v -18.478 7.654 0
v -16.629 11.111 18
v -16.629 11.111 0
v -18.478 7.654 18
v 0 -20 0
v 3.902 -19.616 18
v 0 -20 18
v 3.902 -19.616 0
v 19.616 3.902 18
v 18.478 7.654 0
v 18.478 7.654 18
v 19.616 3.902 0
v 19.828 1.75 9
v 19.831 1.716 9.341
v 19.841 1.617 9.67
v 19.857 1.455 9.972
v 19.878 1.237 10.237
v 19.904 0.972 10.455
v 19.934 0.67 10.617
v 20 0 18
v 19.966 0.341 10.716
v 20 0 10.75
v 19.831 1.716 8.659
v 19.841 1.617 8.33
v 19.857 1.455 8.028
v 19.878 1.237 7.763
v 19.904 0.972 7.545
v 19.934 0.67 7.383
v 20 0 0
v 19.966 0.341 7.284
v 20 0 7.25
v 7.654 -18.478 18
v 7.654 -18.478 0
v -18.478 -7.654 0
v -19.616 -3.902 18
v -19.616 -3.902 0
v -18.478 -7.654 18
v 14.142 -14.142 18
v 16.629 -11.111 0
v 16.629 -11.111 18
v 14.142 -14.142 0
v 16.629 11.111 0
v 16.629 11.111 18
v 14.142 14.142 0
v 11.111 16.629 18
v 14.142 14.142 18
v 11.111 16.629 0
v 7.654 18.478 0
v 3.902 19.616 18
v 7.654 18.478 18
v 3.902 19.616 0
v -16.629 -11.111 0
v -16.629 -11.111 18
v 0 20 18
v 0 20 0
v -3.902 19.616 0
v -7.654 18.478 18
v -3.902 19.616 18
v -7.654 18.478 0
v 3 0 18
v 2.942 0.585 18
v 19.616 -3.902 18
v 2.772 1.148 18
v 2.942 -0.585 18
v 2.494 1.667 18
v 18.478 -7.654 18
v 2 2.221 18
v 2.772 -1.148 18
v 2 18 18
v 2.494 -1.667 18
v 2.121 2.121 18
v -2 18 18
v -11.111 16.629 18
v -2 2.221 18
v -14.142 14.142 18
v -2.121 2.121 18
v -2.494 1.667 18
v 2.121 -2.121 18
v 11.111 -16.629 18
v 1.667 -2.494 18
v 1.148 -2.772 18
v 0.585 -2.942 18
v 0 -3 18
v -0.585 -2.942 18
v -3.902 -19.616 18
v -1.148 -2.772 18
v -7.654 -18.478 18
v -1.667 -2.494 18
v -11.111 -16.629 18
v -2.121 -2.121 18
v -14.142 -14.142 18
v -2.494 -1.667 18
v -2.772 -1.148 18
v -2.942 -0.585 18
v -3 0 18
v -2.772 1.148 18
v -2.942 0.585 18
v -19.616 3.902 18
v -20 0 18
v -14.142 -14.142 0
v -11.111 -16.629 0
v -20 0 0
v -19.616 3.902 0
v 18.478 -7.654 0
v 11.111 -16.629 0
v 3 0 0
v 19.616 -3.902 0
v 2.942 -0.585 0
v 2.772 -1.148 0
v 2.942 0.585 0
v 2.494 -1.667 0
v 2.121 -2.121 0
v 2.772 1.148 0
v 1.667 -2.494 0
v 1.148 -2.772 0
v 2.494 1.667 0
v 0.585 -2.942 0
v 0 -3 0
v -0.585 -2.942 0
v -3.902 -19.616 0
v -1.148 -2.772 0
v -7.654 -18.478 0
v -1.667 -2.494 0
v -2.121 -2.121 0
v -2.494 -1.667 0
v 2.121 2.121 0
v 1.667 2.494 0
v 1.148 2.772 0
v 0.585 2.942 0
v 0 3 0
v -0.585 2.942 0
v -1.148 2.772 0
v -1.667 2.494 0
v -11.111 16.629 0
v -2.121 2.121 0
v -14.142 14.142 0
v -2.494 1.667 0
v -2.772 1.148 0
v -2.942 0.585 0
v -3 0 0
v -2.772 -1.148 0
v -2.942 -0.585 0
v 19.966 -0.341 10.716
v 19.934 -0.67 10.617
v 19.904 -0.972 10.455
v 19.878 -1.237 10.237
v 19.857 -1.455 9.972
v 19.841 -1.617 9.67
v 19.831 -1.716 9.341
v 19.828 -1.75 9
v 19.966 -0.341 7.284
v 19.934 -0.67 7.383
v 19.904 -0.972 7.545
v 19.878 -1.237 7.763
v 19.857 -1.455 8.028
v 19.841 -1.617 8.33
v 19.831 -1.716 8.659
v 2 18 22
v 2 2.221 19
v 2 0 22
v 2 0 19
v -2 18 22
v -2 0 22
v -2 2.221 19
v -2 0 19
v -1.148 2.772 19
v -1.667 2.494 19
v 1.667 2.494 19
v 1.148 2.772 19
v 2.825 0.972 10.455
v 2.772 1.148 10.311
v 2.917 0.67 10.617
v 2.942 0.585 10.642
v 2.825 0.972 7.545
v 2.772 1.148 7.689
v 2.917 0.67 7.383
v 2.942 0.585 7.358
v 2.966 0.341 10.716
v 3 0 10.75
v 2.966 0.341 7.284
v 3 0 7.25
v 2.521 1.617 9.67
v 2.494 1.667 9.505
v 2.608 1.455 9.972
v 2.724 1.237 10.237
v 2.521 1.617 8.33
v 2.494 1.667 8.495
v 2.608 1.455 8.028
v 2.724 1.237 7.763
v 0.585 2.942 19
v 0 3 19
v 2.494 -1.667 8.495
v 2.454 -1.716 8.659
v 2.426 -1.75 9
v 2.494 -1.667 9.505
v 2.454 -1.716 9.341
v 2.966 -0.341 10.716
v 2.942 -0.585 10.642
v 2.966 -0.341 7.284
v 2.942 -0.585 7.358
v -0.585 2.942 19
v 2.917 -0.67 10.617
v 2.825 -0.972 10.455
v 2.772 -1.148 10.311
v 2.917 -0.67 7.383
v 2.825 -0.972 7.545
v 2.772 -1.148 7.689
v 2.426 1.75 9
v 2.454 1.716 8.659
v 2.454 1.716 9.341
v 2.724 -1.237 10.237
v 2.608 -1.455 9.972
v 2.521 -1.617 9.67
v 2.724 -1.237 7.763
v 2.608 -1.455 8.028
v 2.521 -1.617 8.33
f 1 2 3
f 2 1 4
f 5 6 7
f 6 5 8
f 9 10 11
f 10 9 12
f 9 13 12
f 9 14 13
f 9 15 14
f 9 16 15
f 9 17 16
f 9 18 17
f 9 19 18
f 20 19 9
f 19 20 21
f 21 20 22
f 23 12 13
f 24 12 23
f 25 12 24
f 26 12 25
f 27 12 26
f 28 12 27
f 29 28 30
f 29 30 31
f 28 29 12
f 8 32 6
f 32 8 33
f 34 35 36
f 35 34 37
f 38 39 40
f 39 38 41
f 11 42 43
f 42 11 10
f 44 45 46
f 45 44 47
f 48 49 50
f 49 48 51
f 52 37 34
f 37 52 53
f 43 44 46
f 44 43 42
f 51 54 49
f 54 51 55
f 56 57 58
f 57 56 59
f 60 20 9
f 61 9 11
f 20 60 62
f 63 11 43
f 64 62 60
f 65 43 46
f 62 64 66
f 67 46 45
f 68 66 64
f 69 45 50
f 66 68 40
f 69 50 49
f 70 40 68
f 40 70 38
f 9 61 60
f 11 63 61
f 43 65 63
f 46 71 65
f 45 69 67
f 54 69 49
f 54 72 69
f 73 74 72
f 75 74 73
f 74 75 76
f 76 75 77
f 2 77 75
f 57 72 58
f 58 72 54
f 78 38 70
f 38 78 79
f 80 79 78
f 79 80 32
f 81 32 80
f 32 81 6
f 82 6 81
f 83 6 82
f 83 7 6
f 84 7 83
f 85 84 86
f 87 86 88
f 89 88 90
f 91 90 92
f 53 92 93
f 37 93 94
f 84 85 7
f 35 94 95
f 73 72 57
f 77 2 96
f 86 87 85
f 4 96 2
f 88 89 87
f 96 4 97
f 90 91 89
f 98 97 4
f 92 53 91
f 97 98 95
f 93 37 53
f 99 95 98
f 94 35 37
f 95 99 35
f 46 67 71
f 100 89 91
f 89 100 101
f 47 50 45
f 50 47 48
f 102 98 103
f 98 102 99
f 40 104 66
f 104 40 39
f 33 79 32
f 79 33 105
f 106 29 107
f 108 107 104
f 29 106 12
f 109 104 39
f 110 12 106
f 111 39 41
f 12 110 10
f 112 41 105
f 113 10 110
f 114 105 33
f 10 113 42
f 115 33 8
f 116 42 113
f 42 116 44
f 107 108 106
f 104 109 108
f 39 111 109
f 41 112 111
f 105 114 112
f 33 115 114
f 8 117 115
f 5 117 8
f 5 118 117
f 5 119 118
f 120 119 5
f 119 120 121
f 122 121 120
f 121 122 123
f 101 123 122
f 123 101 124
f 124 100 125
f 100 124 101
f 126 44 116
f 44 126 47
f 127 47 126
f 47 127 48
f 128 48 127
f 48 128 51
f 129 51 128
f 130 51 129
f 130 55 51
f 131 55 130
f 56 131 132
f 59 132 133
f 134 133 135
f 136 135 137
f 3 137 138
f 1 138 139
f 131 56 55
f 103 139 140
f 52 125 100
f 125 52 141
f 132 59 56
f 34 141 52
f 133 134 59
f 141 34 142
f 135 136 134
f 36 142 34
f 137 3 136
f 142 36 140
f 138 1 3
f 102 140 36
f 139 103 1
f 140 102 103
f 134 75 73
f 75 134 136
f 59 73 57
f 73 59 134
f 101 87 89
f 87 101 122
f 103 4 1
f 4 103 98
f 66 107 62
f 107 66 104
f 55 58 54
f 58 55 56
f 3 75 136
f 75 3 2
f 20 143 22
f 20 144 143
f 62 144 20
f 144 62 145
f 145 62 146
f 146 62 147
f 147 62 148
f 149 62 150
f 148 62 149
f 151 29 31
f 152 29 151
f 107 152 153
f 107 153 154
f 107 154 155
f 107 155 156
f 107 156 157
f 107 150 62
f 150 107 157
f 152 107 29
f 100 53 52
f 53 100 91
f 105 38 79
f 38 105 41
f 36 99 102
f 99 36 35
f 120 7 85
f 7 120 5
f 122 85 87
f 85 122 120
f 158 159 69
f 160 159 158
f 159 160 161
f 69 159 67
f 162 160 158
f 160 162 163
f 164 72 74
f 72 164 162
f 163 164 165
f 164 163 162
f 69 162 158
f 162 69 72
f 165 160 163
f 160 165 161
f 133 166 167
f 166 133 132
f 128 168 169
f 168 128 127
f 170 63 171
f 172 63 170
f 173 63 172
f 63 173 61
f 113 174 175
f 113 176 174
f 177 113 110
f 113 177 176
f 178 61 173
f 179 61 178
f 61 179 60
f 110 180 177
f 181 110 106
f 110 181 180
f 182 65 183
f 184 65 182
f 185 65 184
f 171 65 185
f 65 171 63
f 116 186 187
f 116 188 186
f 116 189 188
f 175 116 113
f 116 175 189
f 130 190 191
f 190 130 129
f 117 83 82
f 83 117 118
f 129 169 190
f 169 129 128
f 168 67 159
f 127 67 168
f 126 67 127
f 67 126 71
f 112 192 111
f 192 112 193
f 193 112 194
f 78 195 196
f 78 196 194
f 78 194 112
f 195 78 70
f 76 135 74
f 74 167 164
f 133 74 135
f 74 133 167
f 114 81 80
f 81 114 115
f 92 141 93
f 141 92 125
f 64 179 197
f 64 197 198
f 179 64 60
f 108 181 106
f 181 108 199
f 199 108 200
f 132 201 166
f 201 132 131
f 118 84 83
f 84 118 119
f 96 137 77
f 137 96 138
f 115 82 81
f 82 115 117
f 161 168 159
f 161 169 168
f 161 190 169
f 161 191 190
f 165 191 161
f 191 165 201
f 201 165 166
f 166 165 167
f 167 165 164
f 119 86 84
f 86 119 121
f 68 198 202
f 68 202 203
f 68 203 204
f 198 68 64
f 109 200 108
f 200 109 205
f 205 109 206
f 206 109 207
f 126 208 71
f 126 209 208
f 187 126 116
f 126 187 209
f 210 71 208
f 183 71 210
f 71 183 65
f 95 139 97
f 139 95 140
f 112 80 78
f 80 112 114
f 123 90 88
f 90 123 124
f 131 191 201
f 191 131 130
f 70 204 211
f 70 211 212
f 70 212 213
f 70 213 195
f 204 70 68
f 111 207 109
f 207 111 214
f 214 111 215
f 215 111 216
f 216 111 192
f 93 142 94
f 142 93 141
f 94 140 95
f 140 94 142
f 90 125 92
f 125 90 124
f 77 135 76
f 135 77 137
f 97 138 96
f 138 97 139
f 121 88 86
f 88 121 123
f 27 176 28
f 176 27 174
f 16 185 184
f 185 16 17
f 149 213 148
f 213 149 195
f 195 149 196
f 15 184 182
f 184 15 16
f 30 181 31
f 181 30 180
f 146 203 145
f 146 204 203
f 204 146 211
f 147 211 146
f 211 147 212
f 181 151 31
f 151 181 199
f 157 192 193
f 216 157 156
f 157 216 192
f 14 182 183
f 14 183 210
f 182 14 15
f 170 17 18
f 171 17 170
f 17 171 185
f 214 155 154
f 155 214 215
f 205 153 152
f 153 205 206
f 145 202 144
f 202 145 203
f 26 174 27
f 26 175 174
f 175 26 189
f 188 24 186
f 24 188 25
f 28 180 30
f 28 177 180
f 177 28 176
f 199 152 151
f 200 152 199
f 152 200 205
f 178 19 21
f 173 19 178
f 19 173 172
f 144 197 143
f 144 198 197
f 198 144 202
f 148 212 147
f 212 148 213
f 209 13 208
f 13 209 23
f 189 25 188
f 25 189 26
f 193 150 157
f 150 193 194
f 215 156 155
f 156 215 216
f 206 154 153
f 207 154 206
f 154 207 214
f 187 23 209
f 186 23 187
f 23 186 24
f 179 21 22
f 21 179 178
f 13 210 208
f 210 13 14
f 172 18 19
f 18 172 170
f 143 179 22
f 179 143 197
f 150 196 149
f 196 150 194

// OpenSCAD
$fn = 32;

// ----------------------------------------------------------------------
// Control knob: pointer knob
// ----------------------------------------------------------------------

// --- parameters (mm) ---
rib_w = 4;                // pointer rib width
rib_h = 5;                // pointer rib height
knob_d = 40;              // knob body diameter
knob_h = 18;              // knob body height
bore_d = 6;               // shaft bore diameter
set_d = 3.5;              // set screw bore diameter

rib_poke = rib_h - 1;  // rib height above the top
total_h = knob_h + rib_h - 1;  // overall height

difference() {
  union() {
    cylinder(h = knob_h, d = knob_d);
    translate([-rib_w / 2, 0, knob_h - 1])
      cube([rib_w, knob_d / 2 - 2, rib_h]);
  }
  translate([0, 0, -1]) cylinder(h = knob_h + 2, d = bore_d);
  translate([-1, 0, knob_h / 2]) rotate([0, 90, 0])
    cylinder(h = knob_d / 2 + bore_d / 2 + 2, d = set_d);}
